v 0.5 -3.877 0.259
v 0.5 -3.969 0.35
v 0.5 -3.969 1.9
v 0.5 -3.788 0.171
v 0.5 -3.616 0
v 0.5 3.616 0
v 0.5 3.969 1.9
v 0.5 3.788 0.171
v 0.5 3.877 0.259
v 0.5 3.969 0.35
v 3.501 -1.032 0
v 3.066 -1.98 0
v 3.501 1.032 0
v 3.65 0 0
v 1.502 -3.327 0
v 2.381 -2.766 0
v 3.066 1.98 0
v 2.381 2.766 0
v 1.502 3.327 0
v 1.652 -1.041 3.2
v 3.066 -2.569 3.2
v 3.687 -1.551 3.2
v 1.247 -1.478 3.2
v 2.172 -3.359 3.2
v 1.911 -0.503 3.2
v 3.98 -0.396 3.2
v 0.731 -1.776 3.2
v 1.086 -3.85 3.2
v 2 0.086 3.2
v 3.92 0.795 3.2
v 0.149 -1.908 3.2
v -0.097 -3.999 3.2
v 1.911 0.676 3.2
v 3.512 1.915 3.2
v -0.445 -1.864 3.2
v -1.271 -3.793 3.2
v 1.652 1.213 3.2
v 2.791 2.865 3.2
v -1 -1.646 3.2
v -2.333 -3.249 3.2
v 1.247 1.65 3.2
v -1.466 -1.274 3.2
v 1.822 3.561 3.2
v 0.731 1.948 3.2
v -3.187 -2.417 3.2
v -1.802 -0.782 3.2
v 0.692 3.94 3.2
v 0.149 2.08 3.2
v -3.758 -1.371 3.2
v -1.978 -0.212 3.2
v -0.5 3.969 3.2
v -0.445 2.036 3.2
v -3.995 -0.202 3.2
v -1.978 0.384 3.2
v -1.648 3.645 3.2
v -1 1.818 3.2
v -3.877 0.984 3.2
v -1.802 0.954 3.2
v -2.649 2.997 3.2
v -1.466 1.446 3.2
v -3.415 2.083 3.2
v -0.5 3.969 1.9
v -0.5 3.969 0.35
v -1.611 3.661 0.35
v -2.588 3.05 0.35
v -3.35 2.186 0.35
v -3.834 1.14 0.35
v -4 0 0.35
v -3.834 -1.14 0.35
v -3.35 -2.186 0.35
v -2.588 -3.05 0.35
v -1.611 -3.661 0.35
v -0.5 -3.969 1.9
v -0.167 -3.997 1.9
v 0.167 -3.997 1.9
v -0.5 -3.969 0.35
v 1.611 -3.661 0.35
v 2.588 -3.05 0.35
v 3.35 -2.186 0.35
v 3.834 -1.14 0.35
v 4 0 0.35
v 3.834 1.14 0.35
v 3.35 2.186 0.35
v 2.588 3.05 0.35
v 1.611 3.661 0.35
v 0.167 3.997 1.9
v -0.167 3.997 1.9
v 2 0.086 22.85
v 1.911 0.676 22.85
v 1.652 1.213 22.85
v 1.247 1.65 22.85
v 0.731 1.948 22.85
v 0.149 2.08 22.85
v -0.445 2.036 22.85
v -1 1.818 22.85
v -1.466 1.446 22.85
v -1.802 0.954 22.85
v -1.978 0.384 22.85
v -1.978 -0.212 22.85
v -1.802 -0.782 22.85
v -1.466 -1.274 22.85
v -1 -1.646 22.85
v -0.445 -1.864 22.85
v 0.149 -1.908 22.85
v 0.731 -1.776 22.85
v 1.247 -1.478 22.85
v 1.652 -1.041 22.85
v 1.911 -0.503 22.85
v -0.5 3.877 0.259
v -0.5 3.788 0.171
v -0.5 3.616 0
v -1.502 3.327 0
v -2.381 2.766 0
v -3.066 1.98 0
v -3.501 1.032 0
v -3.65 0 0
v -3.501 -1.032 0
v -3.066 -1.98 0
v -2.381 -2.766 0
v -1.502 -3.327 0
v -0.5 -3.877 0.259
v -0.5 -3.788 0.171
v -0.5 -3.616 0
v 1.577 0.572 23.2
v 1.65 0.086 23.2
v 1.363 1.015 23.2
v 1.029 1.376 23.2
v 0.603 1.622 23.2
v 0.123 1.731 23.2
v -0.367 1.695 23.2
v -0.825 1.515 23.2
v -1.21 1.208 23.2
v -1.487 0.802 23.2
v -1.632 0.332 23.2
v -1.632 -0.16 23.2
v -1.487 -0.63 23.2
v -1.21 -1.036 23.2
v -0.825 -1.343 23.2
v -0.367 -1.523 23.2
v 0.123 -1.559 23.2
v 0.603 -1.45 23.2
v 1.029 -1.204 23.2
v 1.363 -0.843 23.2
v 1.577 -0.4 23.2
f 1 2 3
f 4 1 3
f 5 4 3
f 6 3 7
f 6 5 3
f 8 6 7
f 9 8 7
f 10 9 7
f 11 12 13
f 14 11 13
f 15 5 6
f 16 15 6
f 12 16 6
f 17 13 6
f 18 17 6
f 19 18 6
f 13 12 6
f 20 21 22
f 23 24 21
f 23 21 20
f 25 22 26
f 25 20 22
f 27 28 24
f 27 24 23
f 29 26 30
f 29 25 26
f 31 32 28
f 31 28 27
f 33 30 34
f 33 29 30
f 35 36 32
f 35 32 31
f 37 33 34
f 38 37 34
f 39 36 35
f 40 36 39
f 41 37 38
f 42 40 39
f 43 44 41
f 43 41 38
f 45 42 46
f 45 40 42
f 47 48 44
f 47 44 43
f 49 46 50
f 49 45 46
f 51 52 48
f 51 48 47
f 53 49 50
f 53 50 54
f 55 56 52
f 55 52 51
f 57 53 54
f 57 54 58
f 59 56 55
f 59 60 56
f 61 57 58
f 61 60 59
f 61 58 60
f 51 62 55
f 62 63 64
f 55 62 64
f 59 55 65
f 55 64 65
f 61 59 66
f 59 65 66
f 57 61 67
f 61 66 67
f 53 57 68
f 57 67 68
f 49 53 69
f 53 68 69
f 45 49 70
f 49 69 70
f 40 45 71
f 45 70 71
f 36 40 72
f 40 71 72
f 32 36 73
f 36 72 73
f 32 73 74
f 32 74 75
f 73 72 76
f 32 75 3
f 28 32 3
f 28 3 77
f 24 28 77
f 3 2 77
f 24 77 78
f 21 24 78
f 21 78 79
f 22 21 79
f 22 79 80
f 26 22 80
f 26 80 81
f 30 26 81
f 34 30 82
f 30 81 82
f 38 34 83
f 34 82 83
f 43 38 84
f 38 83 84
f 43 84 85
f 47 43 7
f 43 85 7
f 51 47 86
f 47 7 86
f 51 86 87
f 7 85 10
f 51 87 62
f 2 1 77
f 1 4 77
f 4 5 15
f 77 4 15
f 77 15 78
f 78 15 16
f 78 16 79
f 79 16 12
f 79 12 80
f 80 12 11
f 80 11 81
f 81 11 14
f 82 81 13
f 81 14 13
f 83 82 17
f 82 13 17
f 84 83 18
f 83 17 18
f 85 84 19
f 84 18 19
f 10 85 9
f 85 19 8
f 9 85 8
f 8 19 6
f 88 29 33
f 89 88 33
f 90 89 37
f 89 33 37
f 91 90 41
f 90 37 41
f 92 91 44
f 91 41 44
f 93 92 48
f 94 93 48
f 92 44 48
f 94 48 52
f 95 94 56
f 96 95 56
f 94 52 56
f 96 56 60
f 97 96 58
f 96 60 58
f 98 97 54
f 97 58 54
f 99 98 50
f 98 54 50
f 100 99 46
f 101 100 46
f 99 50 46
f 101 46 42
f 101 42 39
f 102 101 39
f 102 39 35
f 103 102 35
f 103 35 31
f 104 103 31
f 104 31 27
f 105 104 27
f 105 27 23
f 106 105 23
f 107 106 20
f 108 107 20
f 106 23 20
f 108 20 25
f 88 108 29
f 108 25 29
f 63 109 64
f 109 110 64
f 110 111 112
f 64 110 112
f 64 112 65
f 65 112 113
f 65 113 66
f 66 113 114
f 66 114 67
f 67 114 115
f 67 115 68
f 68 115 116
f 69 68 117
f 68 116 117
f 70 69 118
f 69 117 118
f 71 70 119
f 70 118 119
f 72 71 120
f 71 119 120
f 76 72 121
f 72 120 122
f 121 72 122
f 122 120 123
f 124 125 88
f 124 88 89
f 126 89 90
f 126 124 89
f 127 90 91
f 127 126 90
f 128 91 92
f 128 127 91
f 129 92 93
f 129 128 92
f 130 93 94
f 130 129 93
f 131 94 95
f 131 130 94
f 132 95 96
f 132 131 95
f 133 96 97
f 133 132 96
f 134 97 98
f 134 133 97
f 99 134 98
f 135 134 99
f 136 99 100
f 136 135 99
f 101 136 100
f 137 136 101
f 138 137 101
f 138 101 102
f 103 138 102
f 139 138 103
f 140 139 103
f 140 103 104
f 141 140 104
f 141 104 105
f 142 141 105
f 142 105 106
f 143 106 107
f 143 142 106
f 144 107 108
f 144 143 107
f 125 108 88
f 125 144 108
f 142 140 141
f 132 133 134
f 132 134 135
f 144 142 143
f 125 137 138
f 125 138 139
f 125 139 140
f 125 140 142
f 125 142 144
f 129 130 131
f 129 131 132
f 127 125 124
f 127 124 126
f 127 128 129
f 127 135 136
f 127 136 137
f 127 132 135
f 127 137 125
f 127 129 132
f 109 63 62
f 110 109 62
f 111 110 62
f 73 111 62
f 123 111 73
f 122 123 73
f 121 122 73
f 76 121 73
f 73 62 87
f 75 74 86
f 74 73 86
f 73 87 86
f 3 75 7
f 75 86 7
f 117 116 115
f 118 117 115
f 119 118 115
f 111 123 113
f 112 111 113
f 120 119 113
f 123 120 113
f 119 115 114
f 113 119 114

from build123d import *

# Parameters (mm, degrees)
SKETCH_1_R          = 4
EXTRUDE_1_DEPTH     = 3.2
SKETCH_2_R          = 2
EXTRUDE_2_DEPTH     = 20
CUT_EXTRUDE_1_DEPTH = 1.9
CHAMFER_1_SIZE      = 0.35


with BuildPart() as part:
    # Эскиз1 → Вытянуть1 (new body)
    with BuildSketch(Plane.XY):
        with Locations(Location((0, 0, 0), (0, 0, 97.180755781))):
            Circle(SKETCH_1_R)
    extrude(amount=EXTRUDE_1_DEPTH)

    # Эскиз2 → Вытянуть2 (add)
    with BuildSketch(Plane.XY.offset(3.2)):
        with Locations((0, 0.08601646)):
            Circle(SKETCH_2_R)
    extrude(amount=EXTRUDE_2_DEPTH)

    # Эскиз3 → Вырез-Вытянуть1 (cut)
    with BuildSketch(Plane(origin=(0, 0, 0), x_dir=(-1, 0, 0), z_dir=(0, 0, -1))):
        Polygon((0.5, 4.203337699), (0.5, -4.490059234), (-0.5, -4.7079676), (-0.5, 4.570341264), align=None)
    extrude(amount=-CUT_EXTRUDE_1_DEPTH, mode=Mode.SUBTRACT)

    # Фаска1
    chamfer_1_edges = [part.edges().sort_by_distance(p)[0] for p in [
        (-4, 0, 0),
        (4, 0, 0),
        (-2, 0.08601646, 23.2),
    ]]
    chamfer(chamfer_1_edges, length=CHAMFER_1_SIZE)


solid = part.part
